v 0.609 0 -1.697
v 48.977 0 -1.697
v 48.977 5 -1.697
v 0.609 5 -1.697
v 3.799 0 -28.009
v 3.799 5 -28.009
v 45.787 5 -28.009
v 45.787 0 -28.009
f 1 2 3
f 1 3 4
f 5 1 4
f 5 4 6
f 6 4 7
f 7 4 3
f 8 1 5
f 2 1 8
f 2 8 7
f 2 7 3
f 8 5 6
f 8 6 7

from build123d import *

# Parameters (mm, degrees)
SALIENTE_EXTRUIR1_DEPTH = 30
CORTAR_EXTRUIR2_DEPTH   = 90
CROQUIS5_W              = 20
CROQUIS5_H              = 2
SALIENTE_EXTRUIR2_DEPTH = 3
CHAFL_N1_SIZE           = 15
CHAFL_N1_SIZE2          = 4.585960222
CHAFL_N2_SIZE           = 15
CHAFL_N2_SIZE2          = 4.585960222
CHAFL_N3_SIZE           = 15
CHAFL_N3_SIZE2          = 4.873795443
SALIENTE_EXTRUIR3_DEPTH = 5
CROQUIS7_W              = 20
CROQUIS7_H              = 2
CORTAR_EXTRUIR3_DEPTH   = 65
CROQUIS8_W              = 69.078643268
CROQUIS8_H              = 63.245130673
CORTAR_EXTRUIR4_DEPTH   = 5


with BuildPart() as part:
    # Croquis2 → Saliente-Extruir1 (new body)
    with BuildSketch(Plane(origin=(0, 0, 0), x_dir=(1, 0, 0), z_dir=(0, 1, 0))):
        Polygon((0, 0), (4.293050572, 35.408576274), (-0.206949428, 35.33296049), (-14, 0), align=None)
        Polygon((24.793050572, 35.408576274), (4.293050572, 35.408576274), (3.44434788, 28.408576274), (24.793050572, 28.408576274), align=None)
        Polygon((45.293050572, 35.408576274), (24.793050572, 35.408576274), (24.793050572, 28.408576274), (46.141753264, 28.408576274), align=None)
        Polygon((49.793050572, 35.33296049), (63.586101144, 0), (49.586101144, 0), (45.293050572, 35.408576274), align=None)
    extrude(amount=SALIENTE_EXTRUIR1_DEPTH)

    # Croquis4 → Cortar-Extruir2 (cut, symmetric)
    with BuildSketch(Plane(origin=(0, 0, 0), x_dir=(0, 0, -1), z_dir=(1, 0, 0))):
        Polygon((0, 0), (5, 0), (5, 30), (-4.90661078, 30), (-4.90661078, 0), align=None)
    extrude(amount=CORTAR_EXTRUIR2_DEPTH, both=True, mode=Mode.SUBTRACT)

    # Croquis5 → Saliente-Extruir2 (add)
    with BuildSketch(Plane(origin=(0, 0, 0), x_dir=(-1, 0, 0), z_dir=(0, -1, 0))):
        with Locations((-24.793050572, 32.408576274)):
            Rectangle(CROQUIS5_W, CROQUIS5_H)
    extrude(amount=SALIENTE_EXTRUIR2_DEPTH)

    # Chaflán1
    chafl_n1_edges = [part.edges().sort_by_distance(p)[0] for p in [
        (2.025282044, 30, -16.704288137),
    ]]
    chafl_n1_side = [part.faces().sort_by_distance(p)[0] for p in [
        (2.025282044, 15, -16.704288137),
    ]]
    chamfer(chafl_n1_edges, length=CHAFL_N1_SIZE, length2=CHAFL_N1_SIZE2, reference=chafl_n1_side[0])

    # Chaflán2
    chafl_n2_edges = [part.edges().sort_by_distance(p)[0] for p in [
        (47.5608191, 30, -16.704288137),
    ]]
    chafl_n2_side = [part.faces().sort_by_distance(p)[0] for p in [
        (47.5608191, 15, -16.704288137),
    ]]
    chamfer(chafl_n2_edges, length=CHAFL_N2_SIZE, length2=CHAFL_N2_SIZE2, reference=chafl_n2_side[0])

    # Chaflán3
    chafl_n3_edges = [part.edges().sort_by_distance(p)[0] for p in [
        (24.793050572, 30, -28.408576274),
    ]]
    chafl_n3_side = [part.faces().sort_by_distance(p)[0] for p in [
        (24.793050572, 15.5132008, -28.408576274),
    ]]
    chamfer(chafl_n3_edges, length=CHAFL_N3_SIZE, length2=CHAFL_N3_SIZE2, reference=chafl_n3_side[0])

    # Croquis7 → Cortar-Extruir3 (cut)
    # profile 1 of 3: a face of its own
    with BuildSketch(Plane.XZ):
        Polygon((0.606216209, -38.306494664), (49.793050572, -38.306494664), (49.793050572, -35.33296049), (45.293050572, -35.408576274), (4.293050572, -35.408576274), (-0.206949428, -35.33296049), align=None)
    # profile 2 of 3: a face of its own
    with BuildSketch(Plane.XZ):
        Polygon((-0.206949428, -35.33296049), (49.793050572, -35.33296049), (61.634233768, -5), (48.979884935, -5), (46.141753264, -28.408576274), (3.44434788, -28.408576274), (0.606216209, -5), (-12.048132625, -5), align=None)
        with Locations((24.793050572, -32.408576274)):
            Rectangle(CROQUIS7_W, CROQUIS7_H, mode=Mode.SUBTRACT)
    # profile 3 of 3: a face of its own
    with BuildSketch(Plane.XZ):
        with Locations((24.793050572, -32.408576274)):
            Rectangle(CROQUIS7_W, CROQUIS7_H)
    extrude(amount=-CORTAR_EXTRUIR3_DEPTH, mode=Mode.SUBTRACT)


with BuildPart() as body_2:
    # Croquis6 → Saliente-Extruir3 (new body)
    with BuildSketch(Plane.XZ):
        Polygon((0.608725752, -1.697385274), (3.798779842, -28.008576274), (45.787321302, -28.008576274), (48.977375392, -1.697385274), align=None)
    extrude(amount=-SALIENTE_EXTRUIR3_DEPTH)


with BuildPart() as cortar_extruir3_piece_1:
    # of the separate pieces the step leaves, piece 1, a body of its own (cortar_extruir3_pieces)
    add(part.part.solids().sort_by_distance((14.793050572, 0, -31.408576274))[0])


with BuildPart() as cortar_extruir3_piece_2:
    # of the separate pieces the step leaves, piece 2, a body of its own (cortar_extruir3_pieces)
    add(part.part.solids().sort_by_distance((4.293050572, 0, -35.408576274))[0])


with BuildPart() as cortar_extruir4_tool:
    # Croquis8 → Cortar-Extruir4 (new body)
    with BuildSketch(Plane(origin=(0, 0, -35.408576274), x_dir=(-1, 0, 0), z_dir=(0, 0, -1))):
        with Locations((-28.687723689, 10.469966138)):
            Rectangle(CROQUIS8_W, CROQUIS8_H)
    extrude(amount=-CORTAR_EXTRUIR4_DEPTH)


with BuildPart() as cortar_extruir3_piece_1_1:
    add(cortar_extruir3_piece_1.part)

    # Cortar-Extruir4: cut by cortar_extruir4_tool
    add(cortar_extruir4_tool.part, mode=Mode.SUBTRACT)


with BuildPart() as cortar_extruir3_piece_2_1:
    add(cortar_extruir3_piece_2.part)

    # Cortar-Extruir4: cut by cortar_extruir4_tool
    add(cortar_extruir4_tool.part, mode=Mode.SUBTRACT)


solid = body_2.part
